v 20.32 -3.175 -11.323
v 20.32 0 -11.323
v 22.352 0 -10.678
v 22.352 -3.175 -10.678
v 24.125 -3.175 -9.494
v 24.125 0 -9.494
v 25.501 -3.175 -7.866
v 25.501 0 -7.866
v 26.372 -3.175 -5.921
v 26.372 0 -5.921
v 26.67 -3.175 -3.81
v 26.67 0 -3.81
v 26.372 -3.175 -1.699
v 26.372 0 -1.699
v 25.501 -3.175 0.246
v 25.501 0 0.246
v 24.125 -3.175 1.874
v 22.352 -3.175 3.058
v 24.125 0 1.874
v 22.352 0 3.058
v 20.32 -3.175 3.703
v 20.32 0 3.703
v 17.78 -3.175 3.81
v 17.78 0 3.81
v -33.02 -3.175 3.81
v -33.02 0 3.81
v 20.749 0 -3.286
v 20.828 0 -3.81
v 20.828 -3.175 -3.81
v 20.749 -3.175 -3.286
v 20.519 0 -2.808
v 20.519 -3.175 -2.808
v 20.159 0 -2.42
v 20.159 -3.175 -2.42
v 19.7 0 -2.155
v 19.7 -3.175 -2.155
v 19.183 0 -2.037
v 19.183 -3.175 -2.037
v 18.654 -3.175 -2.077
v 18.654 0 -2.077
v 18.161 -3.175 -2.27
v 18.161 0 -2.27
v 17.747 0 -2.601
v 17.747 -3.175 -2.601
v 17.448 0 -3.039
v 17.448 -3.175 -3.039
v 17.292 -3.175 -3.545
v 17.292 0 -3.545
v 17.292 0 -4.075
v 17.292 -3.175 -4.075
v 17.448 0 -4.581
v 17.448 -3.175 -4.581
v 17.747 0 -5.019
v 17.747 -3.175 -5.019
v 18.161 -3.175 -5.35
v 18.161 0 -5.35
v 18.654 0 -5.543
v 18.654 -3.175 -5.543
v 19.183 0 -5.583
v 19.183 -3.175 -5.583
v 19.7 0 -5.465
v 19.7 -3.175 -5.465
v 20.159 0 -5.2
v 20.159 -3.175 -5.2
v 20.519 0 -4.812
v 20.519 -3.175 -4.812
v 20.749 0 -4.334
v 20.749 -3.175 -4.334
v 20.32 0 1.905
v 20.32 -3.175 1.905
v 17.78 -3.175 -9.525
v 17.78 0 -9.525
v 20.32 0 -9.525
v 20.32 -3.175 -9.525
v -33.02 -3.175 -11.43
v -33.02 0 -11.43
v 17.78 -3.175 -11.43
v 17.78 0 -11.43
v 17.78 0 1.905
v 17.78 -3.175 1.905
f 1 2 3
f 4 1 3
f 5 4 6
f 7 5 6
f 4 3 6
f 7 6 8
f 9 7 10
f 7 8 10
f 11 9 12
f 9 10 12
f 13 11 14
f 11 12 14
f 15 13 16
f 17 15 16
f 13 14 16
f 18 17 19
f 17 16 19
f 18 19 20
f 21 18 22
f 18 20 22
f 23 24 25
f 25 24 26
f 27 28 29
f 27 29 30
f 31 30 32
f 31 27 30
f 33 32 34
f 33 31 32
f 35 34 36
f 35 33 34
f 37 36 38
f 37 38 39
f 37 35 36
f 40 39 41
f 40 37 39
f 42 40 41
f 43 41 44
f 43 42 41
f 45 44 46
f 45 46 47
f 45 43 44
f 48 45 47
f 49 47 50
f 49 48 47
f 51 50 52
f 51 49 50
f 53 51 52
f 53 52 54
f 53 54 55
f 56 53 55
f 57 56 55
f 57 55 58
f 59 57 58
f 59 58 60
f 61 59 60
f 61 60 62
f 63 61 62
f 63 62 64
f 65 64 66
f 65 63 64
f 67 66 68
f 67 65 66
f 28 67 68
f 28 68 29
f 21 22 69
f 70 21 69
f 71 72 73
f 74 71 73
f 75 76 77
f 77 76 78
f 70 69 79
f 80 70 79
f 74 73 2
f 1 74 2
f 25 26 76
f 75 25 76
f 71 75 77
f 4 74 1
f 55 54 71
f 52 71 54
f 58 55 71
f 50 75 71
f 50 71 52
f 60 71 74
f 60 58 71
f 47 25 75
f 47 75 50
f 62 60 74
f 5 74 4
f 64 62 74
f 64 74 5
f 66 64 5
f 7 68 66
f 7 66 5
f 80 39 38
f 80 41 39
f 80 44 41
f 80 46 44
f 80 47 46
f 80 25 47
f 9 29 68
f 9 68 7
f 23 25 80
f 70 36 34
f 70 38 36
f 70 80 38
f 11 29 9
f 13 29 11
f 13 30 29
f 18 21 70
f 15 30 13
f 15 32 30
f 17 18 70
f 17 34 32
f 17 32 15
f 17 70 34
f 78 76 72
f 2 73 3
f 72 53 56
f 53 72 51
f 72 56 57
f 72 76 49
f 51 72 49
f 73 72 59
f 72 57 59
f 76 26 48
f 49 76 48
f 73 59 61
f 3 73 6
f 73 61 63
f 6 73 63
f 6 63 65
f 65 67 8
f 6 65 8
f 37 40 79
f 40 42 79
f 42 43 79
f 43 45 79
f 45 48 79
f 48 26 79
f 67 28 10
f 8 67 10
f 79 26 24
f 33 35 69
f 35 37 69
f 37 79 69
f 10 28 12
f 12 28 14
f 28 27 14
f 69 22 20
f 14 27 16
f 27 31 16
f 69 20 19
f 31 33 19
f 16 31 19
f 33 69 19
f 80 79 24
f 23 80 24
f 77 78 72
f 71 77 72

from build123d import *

# Parameters (mm, degrees)
F0_R     = 1.778
F1_DEPTH = 3.175


with BuildPart() as f1:
    # F0 (on Front) → F1 (new body)
    with BuildSketch(Plane.XZ):
        with BuildLine():
            Line((17.78, 1.905), (17.78, 3.81))
            Line((17.78, 3.81), (-33.02, 3.81))
            Line((-33.02, 3.81), (-33.02, -11.43))
            Line((-33.02, -11.43), (17.78, -11.43))
            Line((17.78, -11.43), (17.78, -9.525))
            Line((17.78, -9.525), (20.32, -9.525))
            Line((20.32, -9.525), (20.32, -11.323421))
            ThreePointArc((20.32, -11.323421), (26.67, -3.81), (20.32, 3.703421))
            Line((20.32, 3.703421), (20.32, 1.905))
            Line((20.32, 1.905), (17.78, 1.905))
        make_face()
        with Locations((19.05, -3.81)):
            Circle(F0_R, mode=Mode.SUBTRACT)
    extrude(amount=F1_DEPTH)


solid = f1.part
